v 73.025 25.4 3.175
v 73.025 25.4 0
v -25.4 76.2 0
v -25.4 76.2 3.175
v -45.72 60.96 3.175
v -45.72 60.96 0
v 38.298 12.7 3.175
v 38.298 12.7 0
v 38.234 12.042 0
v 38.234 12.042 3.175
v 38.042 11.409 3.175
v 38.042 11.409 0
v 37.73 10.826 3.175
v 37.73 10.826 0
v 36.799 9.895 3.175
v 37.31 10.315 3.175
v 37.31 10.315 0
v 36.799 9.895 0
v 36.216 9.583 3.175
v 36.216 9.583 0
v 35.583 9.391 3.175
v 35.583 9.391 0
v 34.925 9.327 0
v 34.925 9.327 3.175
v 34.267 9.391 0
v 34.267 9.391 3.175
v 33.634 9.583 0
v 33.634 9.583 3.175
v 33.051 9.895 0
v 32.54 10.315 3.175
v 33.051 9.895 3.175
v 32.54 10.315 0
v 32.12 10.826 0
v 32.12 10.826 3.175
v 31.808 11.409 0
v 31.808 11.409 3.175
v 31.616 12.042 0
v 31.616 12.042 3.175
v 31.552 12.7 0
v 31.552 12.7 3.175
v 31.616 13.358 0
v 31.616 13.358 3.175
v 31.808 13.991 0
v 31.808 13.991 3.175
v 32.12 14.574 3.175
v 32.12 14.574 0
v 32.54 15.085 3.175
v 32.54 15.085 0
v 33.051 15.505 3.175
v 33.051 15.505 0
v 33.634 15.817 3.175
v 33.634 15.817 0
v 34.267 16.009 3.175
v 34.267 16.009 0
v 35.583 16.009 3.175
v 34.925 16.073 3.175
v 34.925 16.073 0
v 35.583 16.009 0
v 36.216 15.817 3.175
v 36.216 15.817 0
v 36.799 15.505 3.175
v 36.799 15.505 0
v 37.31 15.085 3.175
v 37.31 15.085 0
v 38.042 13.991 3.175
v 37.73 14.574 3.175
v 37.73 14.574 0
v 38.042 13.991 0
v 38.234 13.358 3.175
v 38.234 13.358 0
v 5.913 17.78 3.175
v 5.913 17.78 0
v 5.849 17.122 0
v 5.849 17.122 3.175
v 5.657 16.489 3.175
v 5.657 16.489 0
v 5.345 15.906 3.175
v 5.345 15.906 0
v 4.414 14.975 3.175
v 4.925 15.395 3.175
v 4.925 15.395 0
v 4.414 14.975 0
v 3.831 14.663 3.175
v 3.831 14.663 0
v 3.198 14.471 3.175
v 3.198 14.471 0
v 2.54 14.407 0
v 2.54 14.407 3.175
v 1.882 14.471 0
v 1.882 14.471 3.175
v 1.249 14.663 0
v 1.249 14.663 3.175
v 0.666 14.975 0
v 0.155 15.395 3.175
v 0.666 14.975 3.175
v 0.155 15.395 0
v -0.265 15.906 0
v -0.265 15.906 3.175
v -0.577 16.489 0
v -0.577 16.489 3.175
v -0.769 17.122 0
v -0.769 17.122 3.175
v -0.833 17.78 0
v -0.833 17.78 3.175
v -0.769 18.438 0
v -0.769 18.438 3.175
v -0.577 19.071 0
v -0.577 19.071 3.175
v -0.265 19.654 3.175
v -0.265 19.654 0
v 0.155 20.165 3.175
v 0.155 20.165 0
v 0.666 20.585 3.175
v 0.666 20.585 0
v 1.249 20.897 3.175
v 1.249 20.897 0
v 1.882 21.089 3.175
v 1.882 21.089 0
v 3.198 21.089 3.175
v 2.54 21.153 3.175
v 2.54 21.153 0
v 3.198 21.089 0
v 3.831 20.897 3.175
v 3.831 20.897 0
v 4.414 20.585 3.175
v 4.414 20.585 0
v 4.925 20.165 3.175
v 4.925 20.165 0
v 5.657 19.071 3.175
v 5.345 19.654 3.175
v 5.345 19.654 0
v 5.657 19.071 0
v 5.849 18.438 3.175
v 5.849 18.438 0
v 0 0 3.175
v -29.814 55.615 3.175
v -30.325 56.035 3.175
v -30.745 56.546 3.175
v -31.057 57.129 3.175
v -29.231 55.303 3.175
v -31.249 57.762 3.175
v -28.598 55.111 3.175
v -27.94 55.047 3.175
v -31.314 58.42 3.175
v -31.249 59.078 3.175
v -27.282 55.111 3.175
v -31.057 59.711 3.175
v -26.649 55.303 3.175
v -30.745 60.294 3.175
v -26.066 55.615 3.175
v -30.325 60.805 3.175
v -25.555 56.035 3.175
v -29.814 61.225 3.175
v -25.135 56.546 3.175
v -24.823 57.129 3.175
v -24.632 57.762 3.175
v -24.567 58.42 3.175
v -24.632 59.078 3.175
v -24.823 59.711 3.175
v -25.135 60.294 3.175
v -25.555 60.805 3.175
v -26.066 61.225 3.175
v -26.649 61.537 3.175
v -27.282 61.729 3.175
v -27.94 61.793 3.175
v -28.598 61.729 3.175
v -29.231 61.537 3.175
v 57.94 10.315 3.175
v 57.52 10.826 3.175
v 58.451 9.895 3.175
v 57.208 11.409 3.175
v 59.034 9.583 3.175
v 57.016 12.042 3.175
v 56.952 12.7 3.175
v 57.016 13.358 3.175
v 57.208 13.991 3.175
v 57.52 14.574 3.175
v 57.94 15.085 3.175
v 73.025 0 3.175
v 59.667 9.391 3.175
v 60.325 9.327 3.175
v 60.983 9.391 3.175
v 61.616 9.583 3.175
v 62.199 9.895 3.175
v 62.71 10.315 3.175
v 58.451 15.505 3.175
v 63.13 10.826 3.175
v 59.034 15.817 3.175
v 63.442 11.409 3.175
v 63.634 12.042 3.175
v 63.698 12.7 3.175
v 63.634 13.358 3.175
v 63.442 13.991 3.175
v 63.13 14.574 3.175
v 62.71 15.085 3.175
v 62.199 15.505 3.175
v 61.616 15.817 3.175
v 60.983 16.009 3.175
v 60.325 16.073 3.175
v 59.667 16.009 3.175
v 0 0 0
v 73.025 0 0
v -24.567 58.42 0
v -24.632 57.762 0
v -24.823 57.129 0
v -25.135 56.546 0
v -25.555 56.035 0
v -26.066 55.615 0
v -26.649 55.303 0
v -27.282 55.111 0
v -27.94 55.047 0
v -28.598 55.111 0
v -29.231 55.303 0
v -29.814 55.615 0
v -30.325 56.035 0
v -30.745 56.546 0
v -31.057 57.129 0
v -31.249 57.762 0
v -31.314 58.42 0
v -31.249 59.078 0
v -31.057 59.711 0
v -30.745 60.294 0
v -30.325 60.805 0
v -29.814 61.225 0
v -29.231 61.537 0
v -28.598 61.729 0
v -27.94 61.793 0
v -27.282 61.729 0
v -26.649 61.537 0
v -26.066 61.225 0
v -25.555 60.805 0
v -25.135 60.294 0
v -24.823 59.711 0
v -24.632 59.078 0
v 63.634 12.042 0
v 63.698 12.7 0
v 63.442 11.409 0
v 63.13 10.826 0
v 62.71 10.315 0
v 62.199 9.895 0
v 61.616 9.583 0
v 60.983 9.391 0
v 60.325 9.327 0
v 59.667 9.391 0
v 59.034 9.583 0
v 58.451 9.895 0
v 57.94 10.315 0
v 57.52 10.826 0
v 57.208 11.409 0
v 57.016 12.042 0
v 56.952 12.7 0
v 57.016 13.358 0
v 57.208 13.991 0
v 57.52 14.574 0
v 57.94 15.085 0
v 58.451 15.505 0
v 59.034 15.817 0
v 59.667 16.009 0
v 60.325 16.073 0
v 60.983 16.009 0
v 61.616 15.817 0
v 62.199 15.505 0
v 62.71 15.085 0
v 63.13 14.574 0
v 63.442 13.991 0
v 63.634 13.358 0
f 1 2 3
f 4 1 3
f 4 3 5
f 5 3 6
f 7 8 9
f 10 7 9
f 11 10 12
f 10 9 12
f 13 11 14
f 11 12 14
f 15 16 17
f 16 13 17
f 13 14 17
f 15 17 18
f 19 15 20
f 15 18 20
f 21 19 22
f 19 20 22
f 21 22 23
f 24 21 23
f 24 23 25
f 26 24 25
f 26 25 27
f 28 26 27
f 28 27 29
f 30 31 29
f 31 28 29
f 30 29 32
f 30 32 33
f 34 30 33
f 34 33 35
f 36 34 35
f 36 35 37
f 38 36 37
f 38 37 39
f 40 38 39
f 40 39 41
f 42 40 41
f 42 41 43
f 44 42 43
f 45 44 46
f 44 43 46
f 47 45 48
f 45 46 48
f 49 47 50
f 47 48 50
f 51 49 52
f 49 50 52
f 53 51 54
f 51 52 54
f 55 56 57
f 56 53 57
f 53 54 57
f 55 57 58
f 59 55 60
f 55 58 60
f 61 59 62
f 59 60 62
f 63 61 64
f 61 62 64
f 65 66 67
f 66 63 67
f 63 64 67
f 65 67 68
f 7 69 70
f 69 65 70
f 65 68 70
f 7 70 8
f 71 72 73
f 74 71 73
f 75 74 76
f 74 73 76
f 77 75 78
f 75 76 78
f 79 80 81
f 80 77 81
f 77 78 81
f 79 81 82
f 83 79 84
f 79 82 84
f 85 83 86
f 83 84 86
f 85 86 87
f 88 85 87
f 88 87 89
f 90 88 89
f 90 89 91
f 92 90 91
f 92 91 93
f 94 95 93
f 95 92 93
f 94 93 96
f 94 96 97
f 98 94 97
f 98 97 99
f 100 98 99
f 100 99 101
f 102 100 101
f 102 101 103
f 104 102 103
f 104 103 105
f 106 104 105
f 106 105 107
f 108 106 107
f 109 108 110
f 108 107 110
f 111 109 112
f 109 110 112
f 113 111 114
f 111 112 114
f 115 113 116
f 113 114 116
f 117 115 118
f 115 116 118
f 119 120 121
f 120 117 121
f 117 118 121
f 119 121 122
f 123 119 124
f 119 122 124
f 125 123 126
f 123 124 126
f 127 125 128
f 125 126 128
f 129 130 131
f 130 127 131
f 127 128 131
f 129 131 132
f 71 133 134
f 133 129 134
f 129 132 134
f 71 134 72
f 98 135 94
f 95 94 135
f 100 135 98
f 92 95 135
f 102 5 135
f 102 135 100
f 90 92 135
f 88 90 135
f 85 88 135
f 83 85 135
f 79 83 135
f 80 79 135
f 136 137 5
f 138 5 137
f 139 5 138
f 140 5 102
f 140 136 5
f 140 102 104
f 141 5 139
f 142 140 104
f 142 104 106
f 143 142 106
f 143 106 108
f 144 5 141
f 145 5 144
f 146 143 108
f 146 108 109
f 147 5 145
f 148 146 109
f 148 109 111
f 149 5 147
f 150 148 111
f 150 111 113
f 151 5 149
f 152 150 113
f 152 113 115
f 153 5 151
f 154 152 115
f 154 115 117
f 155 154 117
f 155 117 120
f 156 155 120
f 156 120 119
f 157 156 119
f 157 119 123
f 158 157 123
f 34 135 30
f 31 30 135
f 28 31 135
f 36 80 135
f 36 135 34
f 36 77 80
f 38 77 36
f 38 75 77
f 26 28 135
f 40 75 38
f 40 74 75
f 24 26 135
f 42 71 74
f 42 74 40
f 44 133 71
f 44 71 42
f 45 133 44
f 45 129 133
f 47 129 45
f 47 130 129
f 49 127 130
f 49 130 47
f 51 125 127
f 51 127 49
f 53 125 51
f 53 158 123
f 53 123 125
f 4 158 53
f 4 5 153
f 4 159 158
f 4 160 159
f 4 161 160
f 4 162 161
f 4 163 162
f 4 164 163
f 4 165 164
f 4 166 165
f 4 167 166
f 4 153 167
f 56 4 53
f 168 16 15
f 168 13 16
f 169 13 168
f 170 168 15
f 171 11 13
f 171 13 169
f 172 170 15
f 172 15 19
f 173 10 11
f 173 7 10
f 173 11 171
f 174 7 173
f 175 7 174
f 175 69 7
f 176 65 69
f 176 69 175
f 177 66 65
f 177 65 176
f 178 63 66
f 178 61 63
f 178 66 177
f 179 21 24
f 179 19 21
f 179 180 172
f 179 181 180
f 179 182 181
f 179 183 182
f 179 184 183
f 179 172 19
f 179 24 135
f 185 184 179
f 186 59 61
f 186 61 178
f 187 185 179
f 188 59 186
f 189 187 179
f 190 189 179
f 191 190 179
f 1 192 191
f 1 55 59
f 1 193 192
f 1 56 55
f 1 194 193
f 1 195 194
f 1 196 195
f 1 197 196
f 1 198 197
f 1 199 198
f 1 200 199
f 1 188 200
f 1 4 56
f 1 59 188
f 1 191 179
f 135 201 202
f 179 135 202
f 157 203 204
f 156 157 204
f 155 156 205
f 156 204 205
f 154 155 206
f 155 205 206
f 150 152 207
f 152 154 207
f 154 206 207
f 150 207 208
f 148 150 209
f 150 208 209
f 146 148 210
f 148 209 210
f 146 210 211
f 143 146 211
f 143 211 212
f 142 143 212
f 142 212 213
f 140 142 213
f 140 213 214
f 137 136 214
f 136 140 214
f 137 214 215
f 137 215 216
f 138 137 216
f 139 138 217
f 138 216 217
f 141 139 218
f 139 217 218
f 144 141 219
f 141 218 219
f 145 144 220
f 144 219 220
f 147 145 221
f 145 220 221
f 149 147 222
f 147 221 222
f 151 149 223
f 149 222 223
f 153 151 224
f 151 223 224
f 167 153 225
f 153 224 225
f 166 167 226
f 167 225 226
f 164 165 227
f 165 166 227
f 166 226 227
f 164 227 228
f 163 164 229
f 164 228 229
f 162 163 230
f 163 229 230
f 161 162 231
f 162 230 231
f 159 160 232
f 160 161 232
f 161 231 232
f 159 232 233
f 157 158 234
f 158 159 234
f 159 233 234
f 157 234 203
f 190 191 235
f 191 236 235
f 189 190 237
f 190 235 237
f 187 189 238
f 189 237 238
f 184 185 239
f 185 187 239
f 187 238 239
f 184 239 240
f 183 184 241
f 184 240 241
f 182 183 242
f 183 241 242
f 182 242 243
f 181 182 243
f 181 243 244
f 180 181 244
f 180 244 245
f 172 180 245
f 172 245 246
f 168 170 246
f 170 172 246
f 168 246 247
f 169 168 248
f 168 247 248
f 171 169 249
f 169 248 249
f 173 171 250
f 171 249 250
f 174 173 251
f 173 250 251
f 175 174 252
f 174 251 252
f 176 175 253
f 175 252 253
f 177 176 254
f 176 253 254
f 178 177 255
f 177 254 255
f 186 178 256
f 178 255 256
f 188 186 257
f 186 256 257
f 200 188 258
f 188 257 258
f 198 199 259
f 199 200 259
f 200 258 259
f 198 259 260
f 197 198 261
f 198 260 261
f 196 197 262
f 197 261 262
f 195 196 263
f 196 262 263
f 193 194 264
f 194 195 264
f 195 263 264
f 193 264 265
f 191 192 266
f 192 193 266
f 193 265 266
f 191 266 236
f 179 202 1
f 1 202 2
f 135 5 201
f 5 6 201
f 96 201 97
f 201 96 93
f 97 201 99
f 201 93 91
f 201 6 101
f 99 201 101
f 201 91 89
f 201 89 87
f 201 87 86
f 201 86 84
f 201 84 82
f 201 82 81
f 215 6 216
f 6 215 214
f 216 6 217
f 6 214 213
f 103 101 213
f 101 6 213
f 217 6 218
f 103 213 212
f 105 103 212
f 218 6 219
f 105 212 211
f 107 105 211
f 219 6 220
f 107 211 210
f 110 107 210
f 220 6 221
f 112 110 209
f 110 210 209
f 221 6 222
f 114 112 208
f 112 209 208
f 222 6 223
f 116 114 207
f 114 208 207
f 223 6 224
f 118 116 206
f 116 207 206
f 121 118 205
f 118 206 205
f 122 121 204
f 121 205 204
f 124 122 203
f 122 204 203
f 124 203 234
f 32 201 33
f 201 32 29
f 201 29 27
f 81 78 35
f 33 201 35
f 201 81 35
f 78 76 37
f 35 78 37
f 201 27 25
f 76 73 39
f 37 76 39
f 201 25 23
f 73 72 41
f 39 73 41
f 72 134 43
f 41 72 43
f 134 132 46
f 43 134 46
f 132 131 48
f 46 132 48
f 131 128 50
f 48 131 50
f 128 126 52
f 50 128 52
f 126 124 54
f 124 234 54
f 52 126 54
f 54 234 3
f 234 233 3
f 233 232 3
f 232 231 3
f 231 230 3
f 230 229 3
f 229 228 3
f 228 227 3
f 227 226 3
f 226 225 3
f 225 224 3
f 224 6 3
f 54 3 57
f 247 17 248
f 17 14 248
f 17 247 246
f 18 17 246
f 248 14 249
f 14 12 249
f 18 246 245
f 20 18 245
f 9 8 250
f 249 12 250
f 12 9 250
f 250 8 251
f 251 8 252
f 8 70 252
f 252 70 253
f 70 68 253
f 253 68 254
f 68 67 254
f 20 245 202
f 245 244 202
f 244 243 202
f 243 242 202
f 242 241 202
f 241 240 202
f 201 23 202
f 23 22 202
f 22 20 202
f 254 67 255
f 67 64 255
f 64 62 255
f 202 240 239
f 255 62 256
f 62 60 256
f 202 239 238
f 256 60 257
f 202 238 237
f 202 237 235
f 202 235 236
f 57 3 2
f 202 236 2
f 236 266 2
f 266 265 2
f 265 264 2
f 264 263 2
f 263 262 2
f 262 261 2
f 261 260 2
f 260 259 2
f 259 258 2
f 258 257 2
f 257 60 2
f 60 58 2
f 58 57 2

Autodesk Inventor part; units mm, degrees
ref_plane "YZ Plane" through (0, 0, 0) normal (1, 0, 0) x (0, 1, 0)
ref_plane "XZ Plane" through (0, 0, 0) normal (0, 1, 0) x (-1, 0, 0)
ref_plane "XY Plane" through (0, 0, 0) normal (0, 0, 1) x (1, 0, 0)
sketch "Sketch1" plane through (0, 0, 0) normal (0, 0, 1) x (1, 0, 0)
  line L0 (0, 0) -> (73.025, 0)
  line L1 (73.025, 0) -> (73.025, 25.4)
  line L2 (73.025, 25.4) -> (-25.4001, 76.2)
  line L3 (-25.4001, 76.2) -> (-45.7201, 60.9599)
  line L4 (-45.7201, 60.9599) -> (0, 0)
  circle A0 centre (60.325, 12.7) radius 3.3734
  circle A1 centre (34.925, 12.7) radius 3.3734
  circle A2 centre (2.54, 17.78) radius 3.3734
  circle A3 centre (-27.9401, 58.42) radius 3.3734
  line L5 (73.025, 12.7) -> (-9.525, 12.7) construction
  line L6 (-35.5601, 68.5799) -> (15.875, 0) construction
  line L7 (0, 0) -> (49.8292, 37.372) construction
  line L8 (20.32, 15.24) -> (12.7, 25.4) construction
  circle A4 centre (-12.7001, 38.1) radius 3.3734
  dimension "d0" = 73.025
  dimension "d1" = 25.4
  dimension "d2" = 25.4
  dimension "d3" = 76.2
  dimension "d4" = 126.87
  dimension "d5" = 6.7469
  dimension "d6" = 25.4
  dimension "d7" = 12.7
  dimension "d8" = 12.7
  dimension "d12" = 12.7
  dimension "d13" = 25.4
  dimension "d14" = 12.7
  dimension "d15" = 38.1
extrude "Extrusion1" add sketch "Sketch1" along normal blind 3.175 contours L4 L3 L2 L1 L0 | A4
properties part number "angle gusset plate"
